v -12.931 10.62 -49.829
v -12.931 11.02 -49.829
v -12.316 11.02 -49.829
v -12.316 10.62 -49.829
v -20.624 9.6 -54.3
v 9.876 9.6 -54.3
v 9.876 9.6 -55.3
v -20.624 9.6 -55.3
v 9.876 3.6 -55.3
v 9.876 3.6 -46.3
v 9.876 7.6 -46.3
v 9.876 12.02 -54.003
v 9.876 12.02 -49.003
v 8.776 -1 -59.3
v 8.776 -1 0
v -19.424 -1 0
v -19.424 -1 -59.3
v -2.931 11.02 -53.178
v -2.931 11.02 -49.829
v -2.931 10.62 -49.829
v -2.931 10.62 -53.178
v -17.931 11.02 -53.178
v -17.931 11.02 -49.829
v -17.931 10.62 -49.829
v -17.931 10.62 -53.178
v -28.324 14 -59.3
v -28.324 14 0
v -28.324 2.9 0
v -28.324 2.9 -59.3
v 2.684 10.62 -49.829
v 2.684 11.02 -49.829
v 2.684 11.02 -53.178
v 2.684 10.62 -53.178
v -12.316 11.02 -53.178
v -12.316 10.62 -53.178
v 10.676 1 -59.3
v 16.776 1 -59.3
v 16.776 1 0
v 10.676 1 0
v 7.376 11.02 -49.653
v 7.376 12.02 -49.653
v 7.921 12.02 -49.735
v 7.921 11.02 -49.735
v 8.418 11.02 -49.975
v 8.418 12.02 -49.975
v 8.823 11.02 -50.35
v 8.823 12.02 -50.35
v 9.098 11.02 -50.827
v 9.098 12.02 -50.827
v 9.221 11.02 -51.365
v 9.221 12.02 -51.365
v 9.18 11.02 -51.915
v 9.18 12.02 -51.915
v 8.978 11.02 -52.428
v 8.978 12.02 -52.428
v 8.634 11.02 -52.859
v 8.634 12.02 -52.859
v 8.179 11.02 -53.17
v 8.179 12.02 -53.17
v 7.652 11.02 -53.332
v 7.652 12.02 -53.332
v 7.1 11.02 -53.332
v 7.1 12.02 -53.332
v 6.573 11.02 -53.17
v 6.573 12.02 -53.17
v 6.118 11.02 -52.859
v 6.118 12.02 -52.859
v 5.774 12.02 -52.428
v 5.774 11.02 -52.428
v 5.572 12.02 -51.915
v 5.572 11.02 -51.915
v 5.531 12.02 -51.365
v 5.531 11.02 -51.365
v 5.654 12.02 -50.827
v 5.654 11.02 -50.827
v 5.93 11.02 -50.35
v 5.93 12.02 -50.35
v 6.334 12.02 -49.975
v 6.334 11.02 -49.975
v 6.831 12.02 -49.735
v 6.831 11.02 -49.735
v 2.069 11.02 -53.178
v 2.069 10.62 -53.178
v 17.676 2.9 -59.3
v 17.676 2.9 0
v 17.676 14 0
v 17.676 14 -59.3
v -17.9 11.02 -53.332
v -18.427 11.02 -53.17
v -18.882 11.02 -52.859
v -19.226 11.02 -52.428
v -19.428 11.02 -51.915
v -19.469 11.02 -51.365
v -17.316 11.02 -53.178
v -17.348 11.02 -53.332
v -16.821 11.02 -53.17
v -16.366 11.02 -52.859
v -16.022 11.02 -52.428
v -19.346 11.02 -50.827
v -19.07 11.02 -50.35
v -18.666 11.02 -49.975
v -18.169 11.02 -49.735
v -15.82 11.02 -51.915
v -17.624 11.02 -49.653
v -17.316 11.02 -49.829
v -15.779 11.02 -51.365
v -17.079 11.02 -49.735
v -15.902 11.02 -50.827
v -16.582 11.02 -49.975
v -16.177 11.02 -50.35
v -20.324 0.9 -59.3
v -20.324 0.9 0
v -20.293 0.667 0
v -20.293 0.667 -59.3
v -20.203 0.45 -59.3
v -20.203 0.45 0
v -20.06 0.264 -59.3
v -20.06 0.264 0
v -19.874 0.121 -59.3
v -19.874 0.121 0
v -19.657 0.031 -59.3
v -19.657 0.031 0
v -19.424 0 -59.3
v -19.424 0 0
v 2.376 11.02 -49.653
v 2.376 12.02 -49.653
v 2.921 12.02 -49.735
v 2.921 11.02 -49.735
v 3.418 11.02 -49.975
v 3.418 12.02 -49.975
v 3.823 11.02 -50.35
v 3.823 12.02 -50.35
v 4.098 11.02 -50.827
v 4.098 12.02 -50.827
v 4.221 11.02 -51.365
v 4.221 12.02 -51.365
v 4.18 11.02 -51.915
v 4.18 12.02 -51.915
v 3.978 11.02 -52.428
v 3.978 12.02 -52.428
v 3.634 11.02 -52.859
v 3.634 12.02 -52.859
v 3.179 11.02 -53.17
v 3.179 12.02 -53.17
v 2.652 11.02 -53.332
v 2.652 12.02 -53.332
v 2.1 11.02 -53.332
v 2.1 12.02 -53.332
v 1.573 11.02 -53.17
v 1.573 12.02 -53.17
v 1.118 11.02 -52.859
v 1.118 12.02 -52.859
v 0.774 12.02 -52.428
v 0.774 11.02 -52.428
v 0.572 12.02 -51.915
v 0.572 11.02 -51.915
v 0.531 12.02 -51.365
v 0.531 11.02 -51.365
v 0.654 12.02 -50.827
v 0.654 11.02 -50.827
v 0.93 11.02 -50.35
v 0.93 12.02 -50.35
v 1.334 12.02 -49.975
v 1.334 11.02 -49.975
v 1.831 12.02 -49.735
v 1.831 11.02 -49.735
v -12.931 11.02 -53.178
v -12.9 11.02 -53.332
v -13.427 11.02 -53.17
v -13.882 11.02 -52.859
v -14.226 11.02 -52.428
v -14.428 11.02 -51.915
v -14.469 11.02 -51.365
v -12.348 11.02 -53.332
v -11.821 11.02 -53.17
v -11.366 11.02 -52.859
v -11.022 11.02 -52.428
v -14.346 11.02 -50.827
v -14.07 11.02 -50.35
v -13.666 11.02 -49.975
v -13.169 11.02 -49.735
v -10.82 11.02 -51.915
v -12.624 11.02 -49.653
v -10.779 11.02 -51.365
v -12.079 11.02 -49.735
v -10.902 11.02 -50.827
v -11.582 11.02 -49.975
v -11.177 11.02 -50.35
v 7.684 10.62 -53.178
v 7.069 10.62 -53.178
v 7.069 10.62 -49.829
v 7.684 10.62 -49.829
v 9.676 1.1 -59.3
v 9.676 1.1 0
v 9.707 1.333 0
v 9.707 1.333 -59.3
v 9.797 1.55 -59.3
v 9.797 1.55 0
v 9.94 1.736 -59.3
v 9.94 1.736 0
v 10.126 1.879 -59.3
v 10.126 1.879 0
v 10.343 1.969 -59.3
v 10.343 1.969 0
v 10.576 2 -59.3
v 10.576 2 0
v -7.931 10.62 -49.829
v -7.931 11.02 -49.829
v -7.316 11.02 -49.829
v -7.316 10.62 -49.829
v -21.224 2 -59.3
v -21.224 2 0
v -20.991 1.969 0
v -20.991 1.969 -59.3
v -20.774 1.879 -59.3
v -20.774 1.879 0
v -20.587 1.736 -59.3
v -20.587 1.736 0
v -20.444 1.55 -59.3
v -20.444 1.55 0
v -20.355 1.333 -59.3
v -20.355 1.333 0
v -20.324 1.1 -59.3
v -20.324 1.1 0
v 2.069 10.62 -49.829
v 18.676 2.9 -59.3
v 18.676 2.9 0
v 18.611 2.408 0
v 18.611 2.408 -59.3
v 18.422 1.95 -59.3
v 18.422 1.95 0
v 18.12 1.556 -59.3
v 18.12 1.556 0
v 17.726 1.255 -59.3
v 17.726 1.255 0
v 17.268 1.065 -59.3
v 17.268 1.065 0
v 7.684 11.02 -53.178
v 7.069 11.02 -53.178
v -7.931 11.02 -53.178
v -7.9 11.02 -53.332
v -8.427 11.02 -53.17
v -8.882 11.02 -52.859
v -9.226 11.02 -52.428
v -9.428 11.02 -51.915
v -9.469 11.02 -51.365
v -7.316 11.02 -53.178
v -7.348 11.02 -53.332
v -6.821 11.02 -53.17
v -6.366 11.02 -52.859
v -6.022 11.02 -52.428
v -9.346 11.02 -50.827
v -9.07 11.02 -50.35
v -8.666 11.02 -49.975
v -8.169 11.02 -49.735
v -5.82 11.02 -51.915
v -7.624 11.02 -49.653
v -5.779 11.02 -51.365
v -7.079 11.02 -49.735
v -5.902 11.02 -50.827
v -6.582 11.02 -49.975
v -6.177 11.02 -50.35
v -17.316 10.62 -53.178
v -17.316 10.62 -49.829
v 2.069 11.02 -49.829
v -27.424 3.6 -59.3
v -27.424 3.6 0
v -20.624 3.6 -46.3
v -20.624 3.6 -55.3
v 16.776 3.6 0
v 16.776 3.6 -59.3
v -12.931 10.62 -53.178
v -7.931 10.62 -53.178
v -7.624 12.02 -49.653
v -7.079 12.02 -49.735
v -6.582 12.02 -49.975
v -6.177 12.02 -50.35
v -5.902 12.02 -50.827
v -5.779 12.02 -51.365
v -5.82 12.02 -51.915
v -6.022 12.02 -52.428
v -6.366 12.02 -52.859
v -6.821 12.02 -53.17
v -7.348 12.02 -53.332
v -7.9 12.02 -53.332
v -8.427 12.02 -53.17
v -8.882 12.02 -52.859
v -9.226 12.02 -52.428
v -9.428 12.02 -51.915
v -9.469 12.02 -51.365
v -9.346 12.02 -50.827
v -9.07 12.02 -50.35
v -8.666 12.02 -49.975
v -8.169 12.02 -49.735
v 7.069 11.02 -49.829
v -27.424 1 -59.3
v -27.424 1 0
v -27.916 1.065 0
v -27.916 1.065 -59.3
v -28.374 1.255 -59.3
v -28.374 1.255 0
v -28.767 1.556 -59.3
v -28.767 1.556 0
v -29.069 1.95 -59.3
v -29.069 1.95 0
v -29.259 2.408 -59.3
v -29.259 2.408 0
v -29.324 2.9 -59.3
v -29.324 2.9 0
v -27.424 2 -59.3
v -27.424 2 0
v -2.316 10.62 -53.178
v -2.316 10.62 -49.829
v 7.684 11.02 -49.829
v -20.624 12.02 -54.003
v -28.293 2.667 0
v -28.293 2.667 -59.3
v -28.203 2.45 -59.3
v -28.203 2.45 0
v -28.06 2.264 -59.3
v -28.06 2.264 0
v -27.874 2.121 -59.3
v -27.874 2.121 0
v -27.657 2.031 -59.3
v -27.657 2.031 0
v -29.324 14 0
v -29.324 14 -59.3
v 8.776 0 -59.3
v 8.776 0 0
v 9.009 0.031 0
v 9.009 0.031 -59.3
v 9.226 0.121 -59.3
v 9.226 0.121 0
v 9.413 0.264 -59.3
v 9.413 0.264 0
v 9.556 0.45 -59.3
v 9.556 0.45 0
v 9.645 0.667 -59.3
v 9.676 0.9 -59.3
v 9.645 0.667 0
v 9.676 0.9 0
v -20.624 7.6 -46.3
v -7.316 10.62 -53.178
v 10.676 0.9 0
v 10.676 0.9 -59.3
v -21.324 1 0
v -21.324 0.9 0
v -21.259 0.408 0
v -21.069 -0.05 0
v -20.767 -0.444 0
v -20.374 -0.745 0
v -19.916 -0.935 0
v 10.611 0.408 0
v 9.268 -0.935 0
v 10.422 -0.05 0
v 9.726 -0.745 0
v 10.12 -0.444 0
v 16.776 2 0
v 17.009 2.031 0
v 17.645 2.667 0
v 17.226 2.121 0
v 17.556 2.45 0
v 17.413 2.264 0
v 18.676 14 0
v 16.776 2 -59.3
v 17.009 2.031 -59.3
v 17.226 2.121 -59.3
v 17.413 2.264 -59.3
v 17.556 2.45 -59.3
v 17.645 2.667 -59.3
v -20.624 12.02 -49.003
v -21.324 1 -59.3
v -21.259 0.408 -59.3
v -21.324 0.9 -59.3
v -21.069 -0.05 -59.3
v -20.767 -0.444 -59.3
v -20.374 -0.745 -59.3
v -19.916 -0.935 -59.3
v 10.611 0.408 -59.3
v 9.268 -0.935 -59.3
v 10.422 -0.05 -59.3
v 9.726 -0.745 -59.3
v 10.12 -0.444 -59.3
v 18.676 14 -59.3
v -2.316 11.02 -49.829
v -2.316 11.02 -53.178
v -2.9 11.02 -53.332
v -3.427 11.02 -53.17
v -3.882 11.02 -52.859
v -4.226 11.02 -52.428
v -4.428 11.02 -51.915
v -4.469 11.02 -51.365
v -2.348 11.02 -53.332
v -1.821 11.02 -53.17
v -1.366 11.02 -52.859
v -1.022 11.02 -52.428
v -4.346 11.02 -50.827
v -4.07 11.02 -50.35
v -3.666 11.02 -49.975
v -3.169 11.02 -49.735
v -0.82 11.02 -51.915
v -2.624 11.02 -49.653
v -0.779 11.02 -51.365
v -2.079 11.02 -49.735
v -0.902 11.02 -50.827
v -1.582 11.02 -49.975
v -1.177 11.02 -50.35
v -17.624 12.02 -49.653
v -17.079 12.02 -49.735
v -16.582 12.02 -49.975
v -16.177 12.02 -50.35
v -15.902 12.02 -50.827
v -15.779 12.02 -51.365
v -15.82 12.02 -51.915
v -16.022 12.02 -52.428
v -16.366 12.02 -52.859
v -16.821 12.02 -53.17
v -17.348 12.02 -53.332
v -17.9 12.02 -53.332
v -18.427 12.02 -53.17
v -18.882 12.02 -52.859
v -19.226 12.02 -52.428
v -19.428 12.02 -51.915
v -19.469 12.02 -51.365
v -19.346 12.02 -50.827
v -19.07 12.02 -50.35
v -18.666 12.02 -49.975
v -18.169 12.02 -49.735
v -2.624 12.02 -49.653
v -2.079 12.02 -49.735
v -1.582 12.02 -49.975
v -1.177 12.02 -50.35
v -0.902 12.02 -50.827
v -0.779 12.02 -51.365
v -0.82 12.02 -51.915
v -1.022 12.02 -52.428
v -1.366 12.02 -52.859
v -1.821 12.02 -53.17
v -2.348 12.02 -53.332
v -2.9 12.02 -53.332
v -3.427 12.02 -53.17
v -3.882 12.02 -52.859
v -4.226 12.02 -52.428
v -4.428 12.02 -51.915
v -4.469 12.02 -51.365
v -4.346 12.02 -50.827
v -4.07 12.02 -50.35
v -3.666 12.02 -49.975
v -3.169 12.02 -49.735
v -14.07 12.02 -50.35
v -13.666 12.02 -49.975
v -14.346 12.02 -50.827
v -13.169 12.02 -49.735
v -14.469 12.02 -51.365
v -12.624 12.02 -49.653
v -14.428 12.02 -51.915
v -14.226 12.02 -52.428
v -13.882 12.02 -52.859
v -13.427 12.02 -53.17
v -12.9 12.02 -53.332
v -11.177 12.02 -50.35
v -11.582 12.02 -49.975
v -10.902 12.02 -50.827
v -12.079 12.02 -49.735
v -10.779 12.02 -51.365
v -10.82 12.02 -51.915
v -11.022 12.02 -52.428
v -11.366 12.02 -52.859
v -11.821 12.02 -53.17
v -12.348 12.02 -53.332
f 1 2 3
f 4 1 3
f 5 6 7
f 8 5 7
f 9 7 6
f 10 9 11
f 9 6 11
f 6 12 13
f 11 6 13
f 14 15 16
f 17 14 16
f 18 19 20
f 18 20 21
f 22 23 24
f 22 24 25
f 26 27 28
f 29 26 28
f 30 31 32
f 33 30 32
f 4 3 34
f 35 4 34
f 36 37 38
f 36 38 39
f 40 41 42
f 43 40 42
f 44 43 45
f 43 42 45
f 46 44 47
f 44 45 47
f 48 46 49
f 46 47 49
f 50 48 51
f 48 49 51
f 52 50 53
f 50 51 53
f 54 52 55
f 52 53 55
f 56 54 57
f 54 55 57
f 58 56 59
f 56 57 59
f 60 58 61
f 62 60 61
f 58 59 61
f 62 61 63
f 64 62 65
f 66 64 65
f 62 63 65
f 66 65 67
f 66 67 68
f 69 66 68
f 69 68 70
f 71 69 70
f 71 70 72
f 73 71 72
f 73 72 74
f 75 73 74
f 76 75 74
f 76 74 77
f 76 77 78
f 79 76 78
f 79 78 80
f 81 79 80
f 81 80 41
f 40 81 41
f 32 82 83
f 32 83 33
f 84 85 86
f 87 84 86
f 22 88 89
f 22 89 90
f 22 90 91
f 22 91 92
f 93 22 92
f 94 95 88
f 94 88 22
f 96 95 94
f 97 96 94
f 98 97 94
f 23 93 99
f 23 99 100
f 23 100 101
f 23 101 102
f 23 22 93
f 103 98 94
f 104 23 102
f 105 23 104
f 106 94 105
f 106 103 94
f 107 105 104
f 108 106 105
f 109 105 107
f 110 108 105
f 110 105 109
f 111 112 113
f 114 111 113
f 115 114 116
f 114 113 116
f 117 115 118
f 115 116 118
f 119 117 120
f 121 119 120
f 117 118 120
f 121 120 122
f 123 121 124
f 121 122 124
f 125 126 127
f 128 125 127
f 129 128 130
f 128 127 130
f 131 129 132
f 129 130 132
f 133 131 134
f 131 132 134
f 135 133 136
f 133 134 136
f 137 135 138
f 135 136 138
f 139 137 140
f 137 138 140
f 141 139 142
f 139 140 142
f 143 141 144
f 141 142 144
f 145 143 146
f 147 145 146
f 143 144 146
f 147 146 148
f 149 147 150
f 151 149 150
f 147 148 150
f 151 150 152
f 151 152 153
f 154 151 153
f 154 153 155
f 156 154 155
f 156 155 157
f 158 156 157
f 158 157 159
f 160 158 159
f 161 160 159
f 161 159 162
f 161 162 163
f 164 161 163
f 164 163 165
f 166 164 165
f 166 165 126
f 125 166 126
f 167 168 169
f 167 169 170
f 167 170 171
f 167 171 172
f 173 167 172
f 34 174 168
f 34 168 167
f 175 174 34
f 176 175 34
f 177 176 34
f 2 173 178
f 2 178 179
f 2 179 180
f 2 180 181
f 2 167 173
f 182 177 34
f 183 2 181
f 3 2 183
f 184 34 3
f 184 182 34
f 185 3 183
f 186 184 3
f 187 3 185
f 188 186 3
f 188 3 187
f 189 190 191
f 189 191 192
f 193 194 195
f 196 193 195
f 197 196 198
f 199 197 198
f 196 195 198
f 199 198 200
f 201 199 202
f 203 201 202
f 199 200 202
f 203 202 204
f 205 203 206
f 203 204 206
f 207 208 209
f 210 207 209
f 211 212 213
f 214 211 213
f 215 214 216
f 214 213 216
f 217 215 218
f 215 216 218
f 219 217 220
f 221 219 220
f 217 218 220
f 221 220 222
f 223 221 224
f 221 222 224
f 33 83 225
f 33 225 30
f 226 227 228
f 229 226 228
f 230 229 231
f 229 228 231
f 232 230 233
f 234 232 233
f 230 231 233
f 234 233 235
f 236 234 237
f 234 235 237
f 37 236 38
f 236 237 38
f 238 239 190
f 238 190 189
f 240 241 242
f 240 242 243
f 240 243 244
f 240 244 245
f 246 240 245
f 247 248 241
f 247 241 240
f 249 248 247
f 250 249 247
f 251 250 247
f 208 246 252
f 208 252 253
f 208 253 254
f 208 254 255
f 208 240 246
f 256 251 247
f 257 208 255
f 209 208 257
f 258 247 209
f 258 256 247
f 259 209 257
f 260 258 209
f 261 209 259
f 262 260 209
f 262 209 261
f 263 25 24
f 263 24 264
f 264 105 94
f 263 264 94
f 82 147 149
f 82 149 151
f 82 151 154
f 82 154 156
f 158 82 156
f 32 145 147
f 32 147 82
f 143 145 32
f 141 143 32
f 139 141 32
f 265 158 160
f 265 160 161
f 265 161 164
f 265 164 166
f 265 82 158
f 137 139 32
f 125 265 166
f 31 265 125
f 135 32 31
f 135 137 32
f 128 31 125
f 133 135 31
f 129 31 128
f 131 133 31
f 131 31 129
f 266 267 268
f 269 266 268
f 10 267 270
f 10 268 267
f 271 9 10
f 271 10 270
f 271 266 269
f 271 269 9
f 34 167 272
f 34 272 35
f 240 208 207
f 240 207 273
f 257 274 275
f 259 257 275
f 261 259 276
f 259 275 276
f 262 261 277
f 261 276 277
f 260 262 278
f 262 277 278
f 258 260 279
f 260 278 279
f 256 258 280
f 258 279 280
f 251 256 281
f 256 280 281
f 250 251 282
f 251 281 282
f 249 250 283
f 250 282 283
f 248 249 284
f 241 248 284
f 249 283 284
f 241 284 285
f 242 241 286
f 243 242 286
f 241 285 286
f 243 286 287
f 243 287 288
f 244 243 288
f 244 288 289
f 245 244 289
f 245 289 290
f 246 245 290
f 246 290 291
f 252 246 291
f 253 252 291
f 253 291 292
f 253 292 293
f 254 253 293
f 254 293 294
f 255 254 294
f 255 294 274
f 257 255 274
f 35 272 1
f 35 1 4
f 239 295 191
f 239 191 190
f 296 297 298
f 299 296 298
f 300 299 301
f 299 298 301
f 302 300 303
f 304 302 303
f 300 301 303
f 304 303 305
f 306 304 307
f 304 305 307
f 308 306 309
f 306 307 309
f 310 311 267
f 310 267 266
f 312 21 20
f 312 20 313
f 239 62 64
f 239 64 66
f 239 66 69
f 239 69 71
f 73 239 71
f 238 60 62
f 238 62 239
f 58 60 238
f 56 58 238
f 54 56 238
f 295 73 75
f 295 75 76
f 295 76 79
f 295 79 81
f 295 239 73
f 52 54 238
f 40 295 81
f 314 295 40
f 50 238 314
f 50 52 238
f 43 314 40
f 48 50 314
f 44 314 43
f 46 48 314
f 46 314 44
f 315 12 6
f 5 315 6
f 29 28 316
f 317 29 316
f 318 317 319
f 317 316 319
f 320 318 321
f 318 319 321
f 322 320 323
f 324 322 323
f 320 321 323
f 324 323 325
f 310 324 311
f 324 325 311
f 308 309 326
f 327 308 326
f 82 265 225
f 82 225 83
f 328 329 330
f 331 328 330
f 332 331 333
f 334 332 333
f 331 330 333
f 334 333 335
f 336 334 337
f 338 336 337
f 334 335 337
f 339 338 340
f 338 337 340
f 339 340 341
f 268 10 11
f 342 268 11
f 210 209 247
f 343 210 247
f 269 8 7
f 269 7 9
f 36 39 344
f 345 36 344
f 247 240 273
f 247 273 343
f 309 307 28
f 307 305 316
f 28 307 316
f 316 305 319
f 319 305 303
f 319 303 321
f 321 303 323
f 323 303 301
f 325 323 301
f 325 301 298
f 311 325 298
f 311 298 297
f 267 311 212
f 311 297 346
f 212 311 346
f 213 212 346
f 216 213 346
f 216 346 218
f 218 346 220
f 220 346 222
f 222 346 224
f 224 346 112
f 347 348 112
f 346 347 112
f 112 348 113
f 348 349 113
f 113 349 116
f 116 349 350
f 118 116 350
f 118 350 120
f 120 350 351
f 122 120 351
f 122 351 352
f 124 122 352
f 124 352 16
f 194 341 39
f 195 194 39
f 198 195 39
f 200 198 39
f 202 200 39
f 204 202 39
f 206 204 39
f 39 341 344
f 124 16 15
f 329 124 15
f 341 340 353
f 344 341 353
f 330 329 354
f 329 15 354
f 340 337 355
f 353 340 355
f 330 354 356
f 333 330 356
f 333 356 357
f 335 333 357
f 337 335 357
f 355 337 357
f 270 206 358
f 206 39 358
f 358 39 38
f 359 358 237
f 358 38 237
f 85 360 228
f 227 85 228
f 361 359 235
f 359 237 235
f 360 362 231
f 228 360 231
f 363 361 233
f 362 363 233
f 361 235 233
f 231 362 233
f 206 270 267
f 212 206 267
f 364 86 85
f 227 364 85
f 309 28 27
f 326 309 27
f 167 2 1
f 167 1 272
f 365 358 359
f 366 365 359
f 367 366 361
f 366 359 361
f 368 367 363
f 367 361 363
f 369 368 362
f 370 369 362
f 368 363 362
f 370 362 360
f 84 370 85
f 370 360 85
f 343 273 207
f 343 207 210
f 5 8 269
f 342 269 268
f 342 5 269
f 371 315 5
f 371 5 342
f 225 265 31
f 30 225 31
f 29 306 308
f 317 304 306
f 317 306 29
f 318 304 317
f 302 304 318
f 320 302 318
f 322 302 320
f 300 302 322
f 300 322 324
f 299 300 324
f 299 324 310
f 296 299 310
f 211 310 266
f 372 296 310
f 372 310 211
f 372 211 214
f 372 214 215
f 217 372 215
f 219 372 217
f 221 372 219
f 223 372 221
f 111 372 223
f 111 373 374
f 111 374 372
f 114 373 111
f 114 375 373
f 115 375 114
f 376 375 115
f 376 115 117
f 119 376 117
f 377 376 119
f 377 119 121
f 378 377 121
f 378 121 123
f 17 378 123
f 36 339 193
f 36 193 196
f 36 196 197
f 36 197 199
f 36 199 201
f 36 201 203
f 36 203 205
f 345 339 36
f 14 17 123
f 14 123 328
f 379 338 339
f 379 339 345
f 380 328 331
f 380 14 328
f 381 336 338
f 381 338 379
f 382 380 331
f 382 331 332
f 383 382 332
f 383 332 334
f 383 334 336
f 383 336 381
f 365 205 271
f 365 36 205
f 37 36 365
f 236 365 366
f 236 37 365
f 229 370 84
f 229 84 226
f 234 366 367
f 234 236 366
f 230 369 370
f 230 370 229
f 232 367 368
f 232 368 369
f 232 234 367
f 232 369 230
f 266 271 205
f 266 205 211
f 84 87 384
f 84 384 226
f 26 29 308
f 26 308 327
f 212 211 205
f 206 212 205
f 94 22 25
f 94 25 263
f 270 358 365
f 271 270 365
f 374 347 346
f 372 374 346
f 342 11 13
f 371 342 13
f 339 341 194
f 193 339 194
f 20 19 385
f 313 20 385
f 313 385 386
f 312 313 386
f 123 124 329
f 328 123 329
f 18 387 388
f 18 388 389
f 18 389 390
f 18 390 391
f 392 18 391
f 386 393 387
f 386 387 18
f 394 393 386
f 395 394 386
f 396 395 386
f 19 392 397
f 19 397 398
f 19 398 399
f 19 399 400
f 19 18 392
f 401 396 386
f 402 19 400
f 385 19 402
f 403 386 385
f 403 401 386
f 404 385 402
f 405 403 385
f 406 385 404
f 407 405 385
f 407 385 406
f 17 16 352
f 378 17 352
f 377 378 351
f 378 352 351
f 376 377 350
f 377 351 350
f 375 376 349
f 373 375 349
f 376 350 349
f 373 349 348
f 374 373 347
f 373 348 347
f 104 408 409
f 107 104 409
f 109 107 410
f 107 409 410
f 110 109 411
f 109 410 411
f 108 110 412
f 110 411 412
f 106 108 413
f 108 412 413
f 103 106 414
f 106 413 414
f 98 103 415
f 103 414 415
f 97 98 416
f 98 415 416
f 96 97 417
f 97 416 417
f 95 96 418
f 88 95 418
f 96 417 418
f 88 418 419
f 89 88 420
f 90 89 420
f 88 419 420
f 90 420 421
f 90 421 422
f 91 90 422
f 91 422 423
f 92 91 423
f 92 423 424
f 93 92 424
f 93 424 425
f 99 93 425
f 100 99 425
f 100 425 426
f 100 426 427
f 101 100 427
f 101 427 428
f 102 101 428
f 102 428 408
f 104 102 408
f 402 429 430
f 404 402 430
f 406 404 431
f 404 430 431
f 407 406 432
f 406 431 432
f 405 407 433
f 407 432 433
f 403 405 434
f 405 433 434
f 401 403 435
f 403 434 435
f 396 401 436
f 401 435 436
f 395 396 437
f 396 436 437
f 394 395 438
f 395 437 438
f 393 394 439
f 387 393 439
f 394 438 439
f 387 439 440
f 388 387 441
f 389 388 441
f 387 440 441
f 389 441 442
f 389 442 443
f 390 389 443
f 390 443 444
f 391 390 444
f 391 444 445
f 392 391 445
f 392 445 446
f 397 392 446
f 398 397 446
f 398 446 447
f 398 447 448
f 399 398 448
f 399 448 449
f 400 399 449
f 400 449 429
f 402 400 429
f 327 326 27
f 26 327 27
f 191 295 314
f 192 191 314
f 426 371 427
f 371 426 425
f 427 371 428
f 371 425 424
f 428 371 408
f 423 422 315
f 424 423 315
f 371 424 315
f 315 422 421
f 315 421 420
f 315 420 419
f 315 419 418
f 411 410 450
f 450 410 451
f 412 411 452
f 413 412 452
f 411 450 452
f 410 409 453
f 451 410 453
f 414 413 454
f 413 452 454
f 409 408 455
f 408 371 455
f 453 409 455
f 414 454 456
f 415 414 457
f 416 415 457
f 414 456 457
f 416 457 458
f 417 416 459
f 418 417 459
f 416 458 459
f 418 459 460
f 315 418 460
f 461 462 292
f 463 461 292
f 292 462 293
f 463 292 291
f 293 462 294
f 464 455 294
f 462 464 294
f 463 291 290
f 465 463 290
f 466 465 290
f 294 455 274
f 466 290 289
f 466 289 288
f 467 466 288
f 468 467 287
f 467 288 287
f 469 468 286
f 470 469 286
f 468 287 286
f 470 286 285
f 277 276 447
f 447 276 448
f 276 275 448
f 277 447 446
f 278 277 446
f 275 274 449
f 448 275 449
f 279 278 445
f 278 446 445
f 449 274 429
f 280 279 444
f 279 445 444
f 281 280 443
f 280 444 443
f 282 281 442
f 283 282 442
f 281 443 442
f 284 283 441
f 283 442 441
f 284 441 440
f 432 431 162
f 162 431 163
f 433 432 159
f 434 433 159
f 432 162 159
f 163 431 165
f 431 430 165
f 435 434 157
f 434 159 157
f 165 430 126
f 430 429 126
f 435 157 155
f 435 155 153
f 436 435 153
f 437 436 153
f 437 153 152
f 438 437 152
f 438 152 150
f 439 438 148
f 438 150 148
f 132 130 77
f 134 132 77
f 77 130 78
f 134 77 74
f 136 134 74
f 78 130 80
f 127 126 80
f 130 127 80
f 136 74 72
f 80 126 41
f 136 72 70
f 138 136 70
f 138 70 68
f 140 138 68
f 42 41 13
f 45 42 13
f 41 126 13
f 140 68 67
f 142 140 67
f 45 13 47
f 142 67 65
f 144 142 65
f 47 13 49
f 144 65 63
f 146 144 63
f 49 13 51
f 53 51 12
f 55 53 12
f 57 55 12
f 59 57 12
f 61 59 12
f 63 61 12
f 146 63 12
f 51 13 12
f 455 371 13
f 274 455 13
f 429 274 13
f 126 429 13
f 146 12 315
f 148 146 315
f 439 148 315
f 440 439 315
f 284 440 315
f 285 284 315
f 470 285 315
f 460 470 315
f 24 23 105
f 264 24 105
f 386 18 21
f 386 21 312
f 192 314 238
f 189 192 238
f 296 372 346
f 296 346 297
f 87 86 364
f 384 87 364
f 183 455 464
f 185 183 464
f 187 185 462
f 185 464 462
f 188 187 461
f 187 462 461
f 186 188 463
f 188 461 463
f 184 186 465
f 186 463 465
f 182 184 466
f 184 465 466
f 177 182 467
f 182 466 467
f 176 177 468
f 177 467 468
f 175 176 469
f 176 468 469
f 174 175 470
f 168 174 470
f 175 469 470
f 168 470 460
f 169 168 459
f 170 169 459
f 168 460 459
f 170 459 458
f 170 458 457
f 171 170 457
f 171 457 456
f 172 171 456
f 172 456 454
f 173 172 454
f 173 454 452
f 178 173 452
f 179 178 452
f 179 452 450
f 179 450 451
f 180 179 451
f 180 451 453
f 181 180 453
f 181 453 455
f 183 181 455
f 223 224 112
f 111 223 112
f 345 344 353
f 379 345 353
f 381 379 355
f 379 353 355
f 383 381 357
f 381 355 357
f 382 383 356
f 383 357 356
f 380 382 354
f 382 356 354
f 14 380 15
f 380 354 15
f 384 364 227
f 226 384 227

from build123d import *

# Parameters (mm, degrees)
EXTRUDE_THIN1_DEPTH = 59.3
SKETCH2_W           = 44.2
SKETCH2_H           = 59.3
EXTRUDE1_DEPTH      = 1.6
EXTRUDE2_DEPTH      = 30.5
SKETCH4_R           = 1.85
EXTRUDE3_DEPTH      = 1.5
SKETCH6_R           = 1.85
EXTRUDE4_DEPTH      = 0.5
SKETCH8_W           = 0.615121557
SKETCH8_H           = 3.349209548
EXTRUDE5_DEPTH      = 0.4
LPATTERN1_COUNT     = 6
LPATTERN1_PITCH     = 5


with BuildPart() as part:
    # Sketch1 → Extrude-Thin1 (new body)
    with BuildSketch(Plane.XY):
        with BuildLine():
            Line((-28.323886885, 14), (-28.323886885, 2.9))
            ThreePointArc((-28.323886885, 2.9), (-28.060282988, 2.263603897), (-27.423886885, 2))
            Line((-27.423886885, 2), (-21.223886885, 2))
            ThreePointArc((-21.223886885, 2), (-20.587490782, 1.736396103), (-20.323886885, 1.1))
            Line((-20.323886885, 1.1), (-20.323886885, 0.9))
            ThreePointArc((-20.323886885, 0.9), (-20.060282988, 0.263603897), (-19.423886885, 0))
            Line((-19.423886885, 0), (8.776113115, 0))
            ThreePointArc((8.776113115, 0), (9.412509218, 0.263603897), (9.676113115, 0.9))
            Line((9.676113115, 0.9), (9.676113115, 1.1))
            ThreePointArc((9.676113115, 1.1), (9.939717012, 1.736396103), (10.576113115, 2))
            Line((10.576113115, 2), (16.776113115, 2))
            ThreePointArc((16.776113115, 2), (17.412509218, 2.263603897), (17.676113115, 2.9))
            Line((17.676113115, 2.9), (17.676113115, 14))
            Line((17.676113115, 14), (18.676113115, 14))
            Line((18.676113115, 14), (18.676113115, 2.9))
            ThreePointArc((18.676113115, 2.9), (18.119615999, 1.556497116), (16.776113115, 1))
            Line((16.776113115, 1), (10.676113115, 1))
            Line((10.676113115, 1), (10.676113115, 0.9))
            ThreePointArc((10.676113115, 0.9), (10.119615999, -0.443502884), (8.776113115, -1))
            Line((8.776113115, -1), (-19.423886885, -1))
            ThreePointArc((-19.423886885, -1), (-20.767389769, -0.443502884), (-21.323886885, 0.9))
            Line((-21.323886885, 0.9), (-21.323886885, 1))
            Line((-21.323886885, 1), (-27.423886885, 1))
            ThreePointArc((-27.423886885, 1), (-28.767389769, 1.556497116), (-29.323886885, 2.9))
            Line((-29.323886885, 2.9), (-29.323886885, 14))
            Line((-29.323886885, 14), (-28.323886885, 14))
        make_face()
    extrude(amount=-EXTRUDE_THIN1_DEPTH)



with BuildPart() as body_2:
    # Sketch2 → Extrude1 (new body)
    with BuildSketch(Plane(origin=(0, 2, 0), x_dir=(1, 0, 0), z_dir=(0, 1, 0))):
        with Locations((-5.323886885, 29.65)):
            Rectangle(SKETCH2_W, SKETCH2_H)
    extrude(amount=EXTRUDE1_DEPTH)


with BuildPart() as part_1:
    add(part.part)

    add(body_2.part)  # Extrude2 merges body 2
    # Sketch3 → Extrude2 (add)
    with BuildSketch(Plane.ZY.offset(-9.876113115)):
        Polygon((-55.3, 3.6), (-46.3, 3.6), (-46.3, 7.6), (-49.003148697, 12.020138766), (-54.003148697, 12.020138766), (-54.3, 9.6), (-55.3, 9.6), align=None)
    extrude(amount=EXTRUDE2_DEPTH)

    # Sketch4 → Extrude3 (cut)
    with BuildSketch(Plane(origin=(0, 12.020138766, 0), x_dir=(1, 0, 0), z_dir=(0, 1, 0))):
        with Locations(Location((-17.623886885, 51.503148697, 0), (0, 0, 270))):
            Circle(SKETCH4_R)
    extrude3 = extrude(amount=-EXTRUDE3_DEPTH, mode=Mode.SUBTRACT)

    # Sketch6 → Extrude4 (add)
    with BuildSketch(Plane(origin=(0, 10.520138766, 0), x_dir=(1, 0, 0), z_dir=(0, 1, 0))):
        with Locations(Location((-17.623886885, 51.503148697, 0), (0, 0, 270))):
            Circle(SKETCH6_R)
    extrude4 = extrude(amount=EXTRUDE4_DEPTH)

    # Sketch8 → Extrude5 (cut)
    with BuildSketch(Plane(origin=(0, 11.020138766, 0), x_dir=(1, 0, 0), z_dir=(0, 1, 0))):
        with Locations((-17.623886885, 51.503148697)):
            Rectangle(SKETCH8_W, SKETCH8_H)
    extrude5 = extrude(amount=-EXTRUDE5_DEPTH, mode=Mode.SUBTRACT)

    # LPattern1: Extrude3, Extrude4, Extrude5 ×6
    with Locations(*[(i * LPATTERN1_PITCH, 0, 0) for i in range(1, LPATTERN1_COUNT)]):
        add(extrude3, mode=Mode.SUBTRACT)
        add(extrude4)
        add(extrude5, mode=Mode.SUBTRACT)


solid = part_1.part
